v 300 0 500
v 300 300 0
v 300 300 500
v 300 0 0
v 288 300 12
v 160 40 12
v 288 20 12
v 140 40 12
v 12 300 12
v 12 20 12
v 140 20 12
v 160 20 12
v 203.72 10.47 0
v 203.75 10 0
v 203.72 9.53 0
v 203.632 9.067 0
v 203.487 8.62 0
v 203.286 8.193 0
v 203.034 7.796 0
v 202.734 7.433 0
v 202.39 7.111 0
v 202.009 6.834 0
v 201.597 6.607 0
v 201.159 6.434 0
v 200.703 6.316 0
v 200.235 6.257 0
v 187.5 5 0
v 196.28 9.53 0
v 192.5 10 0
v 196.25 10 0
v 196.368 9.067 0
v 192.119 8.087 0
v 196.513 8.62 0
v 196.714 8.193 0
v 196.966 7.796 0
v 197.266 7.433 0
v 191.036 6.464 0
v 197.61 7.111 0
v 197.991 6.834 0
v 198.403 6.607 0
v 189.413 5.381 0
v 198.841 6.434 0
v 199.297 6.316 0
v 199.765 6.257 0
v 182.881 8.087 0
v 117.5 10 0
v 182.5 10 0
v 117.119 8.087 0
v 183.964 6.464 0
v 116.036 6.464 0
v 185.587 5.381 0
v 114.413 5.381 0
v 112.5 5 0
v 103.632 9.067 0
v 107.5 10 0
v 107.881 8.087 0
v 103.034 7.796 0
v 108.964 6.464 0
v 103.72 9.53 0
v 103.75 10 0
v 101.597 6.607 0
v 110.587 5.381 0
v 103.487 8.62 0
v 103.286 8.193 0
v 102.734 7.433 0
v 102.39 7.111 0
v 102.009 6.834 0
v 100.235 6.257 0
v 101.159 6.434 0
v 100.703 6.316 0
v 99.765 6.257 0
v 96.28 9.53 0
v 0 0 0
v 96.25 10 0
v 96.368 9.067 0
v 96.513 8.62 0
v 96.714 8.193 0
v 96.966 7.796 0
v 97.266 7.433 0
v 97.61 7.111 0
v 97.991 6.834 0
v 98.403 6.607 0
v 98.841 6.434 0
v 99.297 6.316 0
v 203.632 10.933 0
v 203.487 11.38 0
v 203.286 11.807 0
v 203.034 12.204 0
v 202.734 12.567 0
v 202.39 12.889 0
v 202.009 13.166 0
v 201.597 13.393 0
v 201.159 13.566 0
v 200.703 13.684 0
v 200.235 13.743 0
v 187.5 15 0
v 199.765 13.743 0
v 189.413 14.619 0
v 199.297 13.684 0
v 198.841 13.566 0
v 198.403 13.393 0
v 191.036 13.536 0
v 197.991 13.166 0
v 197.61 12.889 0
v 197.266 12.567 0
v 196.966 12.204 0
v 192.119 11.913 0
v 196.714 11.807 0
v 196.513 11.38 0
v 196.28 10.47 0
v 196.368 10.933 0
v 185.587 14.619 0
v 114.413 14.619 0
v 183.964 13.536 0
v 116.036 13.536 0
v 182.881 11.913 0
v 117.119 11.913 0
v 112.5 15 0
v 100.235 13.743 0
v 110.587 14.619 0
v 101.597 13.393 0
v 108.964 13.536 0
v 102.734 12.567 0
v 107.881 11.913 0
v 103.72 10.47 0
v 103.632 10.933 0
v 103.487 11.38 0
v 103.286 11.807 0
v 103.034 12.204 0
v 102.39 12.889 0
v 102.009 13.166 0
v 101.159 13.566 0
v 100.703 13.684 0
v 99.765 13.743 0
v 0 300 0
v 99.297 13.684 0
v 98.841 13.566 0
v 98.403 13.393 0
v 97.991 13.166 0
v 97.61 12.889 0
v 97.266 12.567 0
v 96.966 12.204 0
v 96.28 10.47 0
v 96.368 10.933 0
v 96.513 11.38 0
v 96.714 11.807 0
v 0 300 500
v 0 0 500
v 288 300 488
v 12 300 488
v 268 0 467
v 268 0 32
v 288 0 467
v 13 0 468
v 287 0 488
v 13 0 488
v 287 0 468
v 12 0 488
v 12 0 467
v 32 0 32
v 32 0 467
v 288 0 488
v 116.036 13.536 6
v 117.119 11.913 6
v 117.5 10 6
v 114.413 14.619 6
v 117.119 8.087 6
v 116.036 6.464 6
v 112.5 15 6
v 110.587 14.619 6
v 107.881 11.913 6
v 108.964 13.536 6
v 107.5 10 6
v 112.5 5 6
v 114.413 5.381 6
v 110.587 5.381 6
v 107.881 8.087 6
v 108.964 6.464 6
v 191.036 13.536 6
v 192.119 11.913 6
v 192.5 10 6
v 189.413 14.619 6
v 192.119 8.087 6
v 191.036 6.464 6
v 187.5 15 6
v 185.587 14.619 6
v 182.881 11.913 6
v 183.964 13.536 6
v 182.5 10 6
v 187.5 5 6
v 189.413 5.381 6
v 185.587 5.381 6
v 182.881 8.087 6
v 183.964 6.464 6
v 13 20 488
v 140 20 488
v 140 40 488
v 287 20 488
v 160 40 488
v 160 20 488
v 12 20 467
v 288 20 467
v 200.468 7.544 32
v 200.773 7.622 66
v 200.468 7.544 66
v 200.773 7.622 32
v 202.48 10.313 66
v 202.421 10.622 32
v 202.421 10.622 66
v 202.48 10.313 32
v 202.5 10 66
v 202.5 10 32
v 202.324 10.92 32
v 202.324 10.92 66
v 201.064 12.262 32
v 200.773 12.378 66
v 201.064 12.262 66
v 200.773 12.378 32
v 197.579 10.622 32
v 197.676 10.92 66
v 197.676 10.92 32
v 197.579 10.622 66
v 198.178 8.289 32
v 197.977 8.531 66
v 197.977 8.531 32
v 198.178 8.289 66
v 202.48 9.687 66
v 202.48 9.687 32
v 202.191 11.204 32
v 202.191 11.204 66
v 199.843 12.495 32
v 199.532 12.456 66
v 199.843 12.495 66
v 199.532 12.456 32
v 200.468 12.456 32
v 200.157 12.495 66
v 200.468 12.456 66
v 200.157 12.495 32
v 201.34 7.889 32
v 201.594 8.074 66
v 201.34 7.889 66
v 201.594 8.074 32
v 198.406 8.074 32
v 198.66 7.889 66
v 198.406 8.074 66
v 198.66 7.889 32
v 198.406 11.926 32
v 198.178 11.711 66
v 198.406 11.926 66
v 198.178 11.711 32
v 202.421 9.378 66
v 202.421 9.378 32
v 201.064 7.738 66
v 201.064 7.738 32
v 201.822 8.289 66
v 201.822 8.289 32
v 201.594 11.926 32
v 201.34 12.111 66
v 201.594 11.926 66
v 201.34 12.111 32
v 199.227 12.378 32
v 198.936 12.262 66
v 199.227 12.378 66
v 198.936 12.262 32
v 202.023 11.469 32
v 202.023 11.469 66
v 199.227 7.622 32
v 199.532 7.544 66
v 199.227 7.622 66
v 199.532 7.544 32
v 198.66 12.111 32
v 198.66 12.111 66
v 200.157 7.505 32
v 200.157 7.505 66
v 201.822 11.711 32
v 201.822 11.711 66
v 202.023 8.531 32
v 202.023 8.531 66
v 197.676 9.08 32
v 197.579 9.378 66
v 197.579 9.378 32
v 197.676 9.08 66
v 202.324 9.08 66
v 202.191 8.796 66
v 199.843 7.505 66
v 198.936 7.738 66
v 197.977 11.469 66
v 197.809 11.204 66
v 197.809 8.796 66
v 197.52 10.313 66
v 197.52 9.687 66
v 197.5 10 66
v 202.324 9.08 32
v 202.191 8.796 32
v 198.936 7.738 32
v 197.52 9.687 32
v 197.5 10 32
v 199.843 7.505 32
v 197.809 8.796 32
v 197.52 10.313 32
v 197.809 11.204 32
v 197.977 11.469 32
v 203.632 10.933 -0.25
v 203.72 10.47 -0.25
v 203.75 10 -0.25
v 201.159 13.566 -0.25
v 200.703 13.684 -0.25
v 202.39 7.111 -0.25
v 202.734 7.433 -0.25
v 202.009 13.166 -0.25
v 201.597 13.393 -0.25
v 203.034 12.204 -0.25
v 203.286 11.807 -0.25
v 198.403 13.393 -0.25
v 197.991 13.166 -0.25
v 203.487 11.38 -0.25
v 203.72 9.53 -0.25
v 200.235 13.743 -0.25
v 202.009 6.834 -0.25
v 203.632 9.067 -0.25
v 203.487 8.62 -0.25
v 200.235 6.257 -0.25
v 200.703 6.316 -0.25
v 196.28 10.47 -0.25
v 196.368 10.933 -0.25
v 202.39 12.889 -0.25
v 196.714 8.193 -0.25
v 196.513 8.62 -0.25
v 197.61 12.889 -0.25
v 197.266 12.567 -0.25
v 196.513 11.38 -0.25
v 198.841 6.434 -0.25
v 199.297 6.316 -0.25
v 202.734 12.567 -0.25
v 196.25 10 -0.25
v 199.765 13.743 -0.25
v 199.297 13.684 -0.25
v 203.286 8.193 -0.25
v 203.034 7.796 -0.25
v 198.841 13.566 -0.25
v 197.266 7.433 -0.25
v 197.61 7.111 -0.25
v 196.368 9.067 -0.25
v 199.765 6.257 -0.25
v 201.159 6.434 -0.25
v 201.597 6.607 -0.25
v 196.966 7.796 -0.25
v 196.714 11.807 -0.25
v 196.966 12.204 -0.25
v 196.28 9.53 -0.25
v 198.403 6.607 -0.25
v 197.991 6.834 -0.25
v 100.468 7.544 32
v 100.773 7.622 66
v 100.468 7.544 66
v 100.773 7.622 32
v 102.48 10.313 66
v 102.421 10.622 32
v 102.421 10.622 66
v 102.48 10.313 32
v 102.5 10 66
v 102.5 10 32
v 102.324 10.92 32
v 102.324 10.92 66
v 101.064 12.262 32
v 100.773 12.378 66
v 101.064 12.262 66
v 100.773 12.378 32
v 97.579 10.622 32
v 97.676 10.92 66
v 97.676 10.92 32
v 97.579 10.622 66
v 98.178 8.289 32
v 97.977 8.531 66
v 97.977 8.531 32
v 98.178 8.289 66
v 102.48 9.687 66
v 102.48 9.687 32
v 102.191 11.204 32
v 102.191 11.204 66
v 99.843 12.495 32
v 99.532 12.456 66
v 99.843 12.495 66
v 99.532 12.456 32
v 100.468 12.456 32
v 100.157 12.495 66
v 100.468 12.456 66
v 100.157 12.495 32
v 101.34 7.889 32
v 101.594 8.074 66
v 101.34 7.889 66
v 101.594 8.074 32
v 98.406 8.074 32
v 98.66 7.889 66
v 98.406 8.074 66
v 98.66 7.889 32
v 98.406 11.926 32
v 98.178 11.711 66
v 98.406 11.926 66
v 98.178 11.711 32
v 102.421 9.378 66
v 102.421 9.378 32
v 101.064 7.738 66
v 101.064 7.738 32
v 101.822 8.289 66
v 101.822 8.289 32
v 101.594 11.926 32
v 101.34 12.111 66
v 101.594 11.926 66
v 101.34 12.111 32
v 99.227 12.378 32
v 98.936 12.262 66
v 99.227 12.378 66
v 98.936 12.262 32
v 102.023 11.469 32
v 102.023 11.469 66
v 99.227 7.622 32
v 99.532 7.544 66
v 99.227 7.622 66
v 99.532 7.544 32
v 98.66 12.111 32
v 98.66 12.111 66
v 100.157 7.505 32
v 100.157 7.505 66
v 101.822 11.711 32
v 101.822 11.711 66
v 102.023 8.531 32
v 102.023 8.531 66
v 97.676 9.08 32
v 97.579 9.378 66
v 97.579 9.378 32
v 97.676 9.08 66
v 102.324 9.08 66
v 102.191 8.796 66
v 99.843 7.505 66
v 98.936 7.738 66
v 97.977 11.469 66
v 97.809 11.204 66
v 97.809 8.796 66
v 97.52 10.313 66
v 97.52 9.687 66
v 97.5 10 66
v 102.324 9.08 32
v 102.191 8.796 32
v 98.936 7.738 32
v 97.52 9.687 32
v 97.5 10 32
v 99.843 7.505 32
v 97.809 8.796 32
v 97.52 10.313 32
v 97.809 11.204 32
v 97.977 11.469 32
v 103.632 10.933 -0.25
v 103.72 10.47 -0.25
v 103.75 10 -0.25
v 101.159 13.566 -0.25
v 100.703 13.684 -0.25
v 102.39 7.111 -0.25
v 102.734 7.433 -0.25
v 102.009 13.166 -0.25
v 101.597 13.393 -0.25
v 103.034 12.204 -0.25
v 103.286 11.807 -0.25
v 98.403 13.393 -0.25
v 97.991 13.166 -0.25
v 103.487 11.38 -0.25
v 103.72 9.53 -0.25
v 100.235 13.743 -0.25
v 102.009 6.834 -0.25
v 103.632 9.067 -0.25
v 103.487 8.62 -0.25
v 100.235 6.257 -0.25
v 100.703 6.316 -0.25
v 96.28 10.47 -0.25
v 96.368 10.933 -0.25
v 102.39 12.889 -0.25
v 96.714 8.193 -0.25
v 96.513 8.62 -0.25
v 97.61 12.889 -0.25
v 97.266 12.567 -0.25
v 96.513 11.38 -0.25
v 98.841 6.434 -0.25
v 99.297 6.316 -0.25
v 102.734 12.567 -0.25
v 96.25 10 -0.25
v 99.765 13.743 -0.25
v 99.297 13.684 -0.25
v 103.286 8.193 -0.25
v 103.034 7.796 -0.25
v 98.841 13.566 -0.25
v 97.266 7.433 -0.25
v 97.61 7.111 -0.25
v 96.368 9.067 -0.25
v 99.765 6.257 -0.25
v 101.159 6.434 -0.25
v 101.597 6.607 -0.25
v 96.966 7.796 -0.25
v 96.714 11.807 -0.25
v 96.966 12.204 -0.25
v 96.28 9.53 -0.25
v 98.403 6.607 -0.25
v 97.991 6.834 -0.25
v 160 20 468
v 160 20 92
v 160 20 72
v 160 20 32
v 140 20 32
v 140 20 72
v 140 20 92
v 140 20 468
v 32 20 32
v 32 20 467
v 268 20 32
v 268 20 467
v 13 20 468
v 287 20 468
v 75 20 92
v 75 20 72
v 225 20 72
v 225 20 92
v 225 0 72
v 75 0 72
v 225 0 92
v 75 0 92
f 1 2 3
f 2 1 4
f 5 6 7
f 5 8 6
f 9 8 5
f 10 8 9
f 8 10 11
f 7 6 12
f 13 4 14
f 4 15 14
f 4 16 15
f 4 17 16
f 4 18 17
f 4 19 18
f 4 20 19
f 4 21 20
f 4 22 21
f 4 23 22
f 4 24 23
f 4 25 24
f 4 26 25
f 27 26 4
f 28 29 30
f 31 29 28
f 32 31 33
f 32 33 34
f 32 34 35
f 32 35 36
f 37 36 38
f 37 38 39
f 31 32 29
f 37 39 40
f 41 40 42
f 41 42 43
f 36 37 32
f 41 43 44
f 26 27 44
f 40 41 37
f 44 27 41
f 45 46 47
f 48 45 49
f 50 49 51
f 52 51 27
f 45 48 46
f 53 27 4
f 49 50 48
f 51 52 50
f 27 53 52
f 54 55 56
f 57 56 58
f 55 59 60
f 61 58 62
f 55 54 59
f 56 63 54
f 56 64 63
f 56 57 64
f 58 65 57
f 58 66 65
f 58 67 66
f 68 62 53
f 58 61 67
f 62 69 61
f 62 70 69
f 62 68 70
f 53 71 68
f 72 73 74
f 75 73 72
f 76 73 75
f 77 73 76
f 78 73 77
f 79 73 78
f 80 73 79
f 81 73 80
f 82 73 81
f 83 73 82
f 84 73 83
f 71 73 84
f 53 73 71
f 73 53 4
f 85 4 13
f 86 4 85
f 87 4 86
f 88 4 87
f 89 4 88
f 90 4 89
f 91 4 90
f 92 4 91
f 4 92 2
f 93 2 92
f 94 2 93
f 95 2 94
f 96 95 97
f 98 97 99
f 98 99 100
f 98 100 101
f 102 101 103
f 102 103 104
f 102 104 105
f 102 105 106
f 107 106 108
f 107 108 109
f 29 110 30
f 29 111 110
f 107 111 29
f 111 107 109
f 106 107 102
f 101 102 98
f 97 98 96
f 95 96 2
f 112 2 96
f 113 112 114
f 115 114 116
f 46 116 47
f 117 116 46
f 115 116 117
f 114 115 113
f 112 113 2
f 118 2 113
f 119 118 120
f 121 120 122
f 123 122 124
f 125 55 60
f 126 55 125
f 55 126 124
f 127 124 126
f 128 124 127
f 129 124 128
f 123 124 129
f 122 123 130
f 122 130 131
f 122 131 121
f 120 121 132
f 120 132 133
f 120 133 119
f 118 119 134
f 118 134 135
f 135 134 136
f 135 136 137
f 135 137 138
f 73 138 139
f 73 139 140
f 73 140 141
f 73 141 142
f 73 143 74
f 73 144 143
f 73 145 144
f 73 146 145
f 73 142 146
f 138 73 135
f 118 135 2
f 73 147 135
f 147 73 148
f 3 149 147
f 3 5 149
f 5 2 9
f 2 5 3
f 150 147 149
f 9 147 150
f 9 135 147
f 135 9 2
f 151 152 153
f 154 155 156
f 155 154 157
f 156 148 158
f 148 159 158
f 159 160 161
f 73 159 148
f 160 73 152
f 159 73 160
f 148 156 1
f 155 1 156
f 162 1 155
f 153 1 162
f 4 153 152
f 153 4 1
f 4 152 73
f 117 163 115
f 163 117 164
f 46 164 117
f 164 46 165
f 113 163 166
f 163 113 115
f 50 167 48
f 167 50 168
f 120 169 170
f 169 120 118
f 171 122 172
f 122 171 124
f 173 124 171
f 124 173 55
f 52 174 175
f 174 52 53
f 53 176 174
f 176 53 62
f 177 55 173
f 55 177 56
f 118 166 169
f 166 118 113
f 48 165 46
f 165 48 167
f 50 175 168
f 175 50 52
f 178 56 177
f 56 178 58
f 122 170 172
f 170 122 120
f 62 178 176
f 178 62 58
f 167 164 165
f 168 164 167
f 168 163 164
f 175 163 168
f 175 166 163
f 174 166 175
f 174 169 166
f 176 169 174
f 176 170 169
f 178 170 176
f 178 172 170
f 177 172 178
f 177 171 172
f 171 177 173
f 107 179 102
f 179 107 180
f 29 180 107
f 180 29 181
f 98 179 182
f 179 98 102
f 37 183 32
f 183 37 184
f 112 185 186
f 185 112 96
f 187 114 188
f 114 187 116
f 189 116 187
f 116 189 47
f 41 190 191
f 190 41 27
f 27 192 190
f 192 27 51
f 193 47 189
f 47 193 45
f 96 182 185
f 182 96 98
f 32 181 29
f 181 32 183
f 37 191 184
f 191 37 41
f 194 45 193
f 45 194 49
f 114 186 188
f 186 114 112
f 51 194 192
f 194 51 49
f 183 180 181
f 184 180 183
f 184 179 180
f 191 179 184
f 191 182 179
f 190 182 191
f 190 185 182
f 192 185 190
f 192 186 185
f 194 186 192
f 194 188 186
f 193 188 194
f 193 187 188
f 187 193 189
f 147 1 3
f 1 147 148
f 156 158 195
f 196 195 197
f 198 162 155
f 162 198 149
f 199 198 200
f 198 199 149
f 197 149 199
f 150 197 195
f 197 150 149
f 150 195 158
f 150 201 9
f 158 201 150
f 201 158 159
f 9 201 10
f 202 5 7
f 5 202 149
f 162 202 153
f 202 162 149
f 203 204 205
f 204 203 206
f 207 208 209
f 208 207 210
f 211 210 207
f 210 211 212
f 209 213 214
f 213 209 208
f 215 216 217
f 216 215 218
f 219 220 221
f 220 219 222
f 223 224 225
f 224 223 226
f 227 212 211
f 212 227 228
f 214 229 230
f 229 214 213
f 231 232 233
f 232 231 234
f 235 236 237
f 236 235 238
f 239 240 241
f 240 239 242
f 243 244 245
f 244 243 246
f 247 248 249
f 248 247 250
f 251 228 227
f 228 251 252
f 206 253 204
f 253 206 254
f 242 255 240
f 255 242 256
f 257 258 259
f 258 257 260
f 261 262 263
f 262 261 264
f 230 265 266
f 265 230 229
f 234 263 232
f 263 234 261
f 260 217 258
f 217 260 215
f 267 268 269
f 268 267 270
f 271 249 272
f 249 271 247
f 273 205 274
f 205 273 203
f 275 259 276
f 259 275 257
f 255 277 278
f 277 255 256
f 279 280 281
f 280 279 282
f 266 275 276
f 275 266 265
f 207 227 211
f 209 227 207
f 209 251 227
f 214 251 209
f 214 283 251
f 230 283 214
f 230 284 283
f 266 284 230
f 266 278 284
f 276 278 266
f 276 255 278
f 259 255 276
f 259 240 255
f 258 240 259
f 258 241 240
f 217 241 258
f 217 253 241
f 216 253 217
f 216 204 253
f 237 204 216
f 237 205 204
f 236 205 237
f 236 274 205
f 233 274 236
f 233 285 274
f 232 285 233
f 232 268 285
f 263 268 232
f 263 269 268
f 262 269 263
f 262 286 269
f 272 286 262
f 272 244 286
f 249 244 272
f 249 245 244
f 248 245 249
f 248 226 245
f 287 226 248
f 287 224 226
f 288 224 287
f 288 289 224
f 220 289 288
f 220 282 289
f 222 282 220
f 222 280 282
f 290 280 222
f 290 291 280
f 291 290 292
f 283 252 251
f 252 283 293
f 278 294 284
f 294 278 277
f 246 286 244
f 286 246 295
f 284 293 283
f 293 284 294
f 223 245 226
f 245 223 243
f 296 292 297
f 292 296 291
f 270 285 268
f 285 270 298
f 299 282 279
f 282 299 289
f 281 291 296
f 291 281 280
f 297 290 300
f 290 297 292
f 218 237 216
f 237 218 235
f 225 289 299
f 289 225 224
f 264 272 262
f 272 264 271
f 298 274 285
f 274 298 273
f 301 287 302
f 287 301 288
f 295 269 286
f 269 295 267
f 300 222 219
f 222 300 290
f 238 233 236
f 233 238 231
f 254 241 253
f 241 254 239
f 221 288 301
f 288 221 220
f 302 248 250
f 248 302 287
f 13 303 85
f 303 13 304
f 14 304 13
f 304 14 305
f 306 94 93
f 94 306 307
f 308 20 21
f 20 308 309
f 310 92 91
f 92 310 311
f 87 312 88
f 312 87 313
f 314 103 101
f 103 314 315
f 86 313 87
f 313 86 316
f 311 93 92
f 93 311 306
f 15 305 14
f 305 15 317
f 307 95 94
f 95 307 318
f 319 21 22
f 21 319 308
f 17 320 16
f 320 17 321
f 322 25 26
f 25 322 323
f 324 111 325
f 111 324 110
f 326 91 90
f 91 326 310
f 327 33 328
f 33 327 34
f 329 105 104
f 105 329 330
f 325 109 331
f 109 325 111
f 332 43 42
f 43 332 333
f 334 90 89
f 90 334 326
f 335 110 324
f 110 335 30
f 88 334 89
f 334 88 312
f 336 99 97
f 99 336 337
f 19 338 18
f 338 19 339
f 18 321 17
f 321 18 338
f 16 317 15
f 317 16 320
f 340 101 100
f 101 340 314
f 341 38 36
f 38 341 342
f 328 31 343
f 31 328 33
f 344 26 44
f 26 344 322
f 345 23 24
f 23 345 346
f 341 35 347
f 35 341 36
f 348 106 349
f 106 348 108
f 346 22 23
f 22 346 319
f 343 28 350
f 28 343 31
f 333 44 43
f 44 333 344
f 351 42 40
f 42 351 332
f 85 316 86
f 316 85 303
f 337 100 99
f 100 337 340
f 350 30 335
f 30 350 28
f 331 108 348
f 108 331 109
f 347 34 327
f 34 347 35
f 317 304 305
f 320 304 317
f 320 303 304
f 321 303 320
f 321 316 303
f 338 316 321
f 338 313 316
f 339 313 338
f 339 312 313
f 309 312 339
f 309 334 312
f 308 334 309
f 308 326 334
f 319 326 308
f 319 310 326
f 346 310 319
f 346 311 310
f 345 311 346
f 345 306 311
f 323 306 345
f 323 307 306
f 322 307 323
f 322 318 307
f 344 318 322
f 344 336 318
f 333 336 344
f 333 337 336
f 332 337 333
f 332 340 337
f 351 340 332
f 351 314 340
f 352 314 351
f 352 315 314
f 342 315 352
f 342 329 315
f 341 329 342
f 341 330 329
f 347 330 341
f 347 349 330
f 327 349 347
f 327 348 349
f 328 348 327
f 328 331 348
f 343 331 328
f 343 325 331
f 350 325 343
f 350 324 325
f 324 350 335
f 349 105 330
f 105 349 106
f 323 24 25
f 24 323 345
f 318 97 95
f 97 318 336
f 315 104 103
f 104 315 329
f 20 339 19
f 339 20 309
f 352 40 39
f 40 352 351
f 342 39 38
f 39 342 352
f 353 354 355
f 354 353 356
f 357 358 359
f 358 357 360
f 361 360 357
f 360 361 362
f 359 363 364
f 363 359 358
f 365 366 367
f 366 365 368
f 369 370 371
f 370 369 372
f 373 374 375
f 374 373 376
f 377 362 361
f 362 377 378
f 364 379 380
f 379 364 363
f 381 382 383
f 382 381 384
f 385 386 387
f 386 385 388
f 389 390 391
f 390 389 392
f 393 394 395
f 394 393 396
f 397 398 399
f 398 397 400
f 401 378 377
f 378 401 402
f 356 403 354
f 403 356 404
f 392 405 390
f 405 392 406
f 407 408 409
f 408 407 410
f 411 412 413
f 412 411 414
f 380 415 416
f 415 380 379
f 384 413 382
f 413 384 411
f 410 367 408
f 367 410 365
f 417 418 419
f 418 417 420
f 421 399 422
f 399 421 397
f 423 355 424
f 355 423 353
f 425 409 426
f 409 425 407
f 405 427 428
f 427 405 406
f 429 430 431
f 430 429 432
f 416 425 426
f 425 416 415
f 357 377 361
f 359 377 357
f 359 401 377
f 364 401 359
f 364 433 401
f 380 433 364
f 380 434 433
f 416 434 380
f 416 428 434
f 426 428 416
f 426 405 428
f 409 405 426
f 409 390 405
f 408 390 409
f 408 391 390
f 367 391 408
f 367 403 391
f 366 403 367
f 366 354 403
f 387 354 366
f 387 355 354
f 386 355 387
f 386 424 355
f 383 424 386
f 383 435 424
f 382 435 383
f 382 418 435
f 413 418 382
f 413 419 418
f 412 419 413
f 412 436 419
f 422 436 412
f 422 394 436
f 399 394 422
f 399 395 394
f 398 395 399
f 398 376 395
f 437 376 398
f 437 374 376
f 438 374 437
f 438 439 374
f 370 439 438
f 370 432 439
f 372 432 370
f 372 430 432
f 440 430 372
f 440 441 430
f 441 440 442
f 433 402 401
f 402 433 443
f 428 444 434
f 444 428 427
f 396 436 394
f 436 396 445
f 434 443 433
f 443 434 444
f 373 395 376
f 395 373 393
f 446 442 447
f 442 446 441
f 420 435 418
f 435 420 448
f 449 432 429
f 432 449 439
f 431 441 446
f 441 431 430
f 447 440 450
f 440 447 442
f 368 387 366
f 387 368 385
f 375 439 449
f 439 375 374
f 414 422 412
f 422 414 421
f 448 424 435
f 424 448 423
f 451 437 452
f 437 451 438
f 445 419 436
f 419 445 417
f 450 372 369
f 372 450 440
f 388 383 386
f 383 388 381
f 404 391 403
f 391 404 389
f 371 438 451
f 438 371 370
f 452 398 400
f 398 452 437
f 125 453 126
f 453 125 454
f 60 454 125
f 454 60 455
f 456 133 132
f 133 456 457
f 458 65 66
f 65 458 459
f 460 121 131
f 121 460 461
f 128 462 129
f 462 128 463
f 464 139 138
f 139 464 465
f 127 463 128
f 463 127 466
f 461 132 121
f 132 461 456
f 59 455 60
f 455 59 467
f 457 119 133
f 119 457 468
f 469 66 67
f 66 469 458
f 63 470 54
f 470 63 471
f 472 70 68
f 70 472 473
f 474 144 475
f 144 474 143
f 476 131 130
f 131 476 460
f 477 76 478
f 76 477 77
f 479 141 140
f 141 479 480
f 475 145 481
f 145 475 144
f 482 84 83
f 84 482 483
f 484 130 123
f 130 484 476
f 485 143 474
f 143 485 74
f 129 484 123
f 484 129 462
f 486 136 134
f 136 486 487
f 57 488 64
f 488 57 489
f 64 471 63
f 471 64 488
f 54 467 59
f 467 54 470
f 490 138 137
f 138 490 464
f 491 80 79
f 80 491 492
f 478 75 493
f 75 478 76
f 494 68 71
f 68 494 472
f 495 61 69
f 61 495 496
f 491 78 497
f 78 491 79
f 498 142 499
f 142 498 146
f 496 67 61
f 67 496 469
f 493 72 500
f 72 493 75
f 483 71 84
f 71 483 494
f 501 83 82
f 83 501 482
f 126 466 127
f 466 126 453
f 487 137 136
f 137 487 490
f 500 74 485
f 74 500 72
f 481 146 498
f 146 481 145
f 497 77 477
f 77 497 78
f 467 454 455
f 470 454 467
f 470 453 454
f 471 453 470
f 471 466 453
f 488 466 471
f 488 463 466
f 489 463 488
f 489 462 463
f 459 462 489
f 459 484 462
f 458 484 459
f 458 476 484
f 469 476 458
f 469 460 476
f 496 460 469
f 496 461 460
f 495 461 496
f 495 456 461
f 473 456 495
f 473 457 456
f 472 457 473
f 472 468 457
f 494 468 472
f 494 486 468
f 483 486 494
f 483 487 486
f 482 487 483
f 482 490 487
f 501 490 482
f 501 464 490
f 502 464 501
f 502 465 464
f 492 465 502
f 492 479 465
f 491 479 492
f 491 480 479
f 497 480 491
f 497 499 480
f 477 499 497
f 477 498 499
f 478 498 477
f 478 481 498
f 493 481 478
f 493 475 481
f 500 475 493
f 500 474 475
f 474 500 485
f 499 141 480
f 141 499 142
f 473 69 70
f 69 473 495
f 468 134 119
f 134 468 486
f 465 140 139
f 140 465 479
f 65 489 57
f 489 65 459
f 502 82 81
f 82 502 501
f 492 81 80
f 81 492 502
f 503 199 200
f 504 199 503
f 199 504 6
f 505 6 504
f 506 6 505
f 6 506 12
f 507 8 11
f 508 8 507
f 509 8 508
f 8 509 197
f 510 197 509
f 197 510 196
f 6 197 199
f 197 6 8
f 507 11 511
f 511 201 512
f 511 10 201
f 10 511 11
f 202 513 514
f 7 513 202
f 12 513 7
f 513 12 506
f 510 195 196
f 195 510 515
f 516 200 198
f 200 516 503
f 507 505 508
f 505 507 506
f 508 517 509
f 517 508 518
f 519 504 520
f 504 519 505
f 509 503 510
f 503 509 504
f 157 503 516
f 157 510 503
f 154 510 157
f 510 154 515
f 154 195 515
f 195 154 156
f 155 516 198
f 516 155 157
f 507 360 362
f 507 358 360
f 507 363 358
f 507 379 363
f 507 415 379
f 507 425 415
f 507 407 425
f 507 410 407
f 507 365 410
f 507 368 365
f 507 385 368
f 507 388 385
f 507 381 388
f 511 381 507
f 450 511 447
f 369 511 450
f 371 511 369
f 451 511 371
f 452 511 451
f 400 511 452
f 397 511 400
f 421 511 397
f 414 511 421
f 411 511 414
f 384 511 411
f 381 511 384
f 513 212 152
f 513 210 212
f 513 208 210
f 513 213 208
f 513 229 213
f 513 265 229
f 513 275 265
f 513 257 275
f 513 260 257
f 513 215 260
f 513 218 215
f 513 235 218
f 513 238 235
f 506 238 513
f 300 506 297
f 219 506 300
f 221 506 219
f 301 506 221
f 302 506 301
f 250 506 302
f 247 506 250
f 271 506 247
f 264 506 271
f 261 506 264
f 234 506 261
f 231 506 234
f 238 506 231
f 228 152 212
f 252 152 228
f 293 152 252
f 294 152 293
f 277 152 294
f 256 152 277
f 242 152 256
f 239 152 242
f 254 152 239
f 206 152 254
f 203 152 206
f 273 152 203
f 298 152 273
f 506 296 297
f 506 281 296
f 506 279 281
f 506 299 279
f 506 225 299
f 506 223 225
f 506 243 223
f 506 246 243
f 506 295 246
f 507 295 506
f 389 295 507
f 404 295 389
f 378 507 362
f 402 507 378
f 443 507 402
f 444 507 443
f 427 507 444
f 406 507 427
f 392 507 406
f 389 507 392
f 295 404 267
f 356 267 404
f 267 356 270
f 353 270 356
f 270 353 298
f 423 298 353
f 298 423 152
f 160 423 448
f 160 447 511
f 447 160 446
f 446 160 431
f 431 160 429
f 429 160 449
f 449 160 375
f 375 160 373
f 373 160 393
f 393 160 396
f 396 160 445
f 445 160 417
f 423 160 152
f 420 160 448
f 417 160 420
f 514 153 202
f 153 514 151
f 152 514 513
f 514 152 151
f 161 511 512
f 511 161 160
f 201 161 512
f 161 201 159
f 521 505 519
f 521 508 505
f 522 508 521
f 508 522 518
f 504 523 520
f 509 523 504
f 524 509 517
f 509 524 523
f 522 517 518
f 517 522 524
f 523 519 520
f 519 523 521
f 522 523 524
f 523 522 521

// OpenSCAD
// construction of a peruvian drawer
// byteborg 2012
// rudimentary BOM will be echoed on compile

use <MCAD/metric_fastners.scad>;

// system constants
GR = 1.618;  // golden ratio
q = 1;       // precision offset (diff/tolerance)

// material thickness
TCORP = 12;  // corpus
TFRONT = 3;  // front (tapa)
TBACK = 6;   // back
TSQ = 20;    // square wood

// outer dimensions
XDIM = 300;  // width
YDIM = 300;  // depth
ZDIM = 500;  // height

// port dimension
HDIA = 120;
HX = XDIM-(XDIM / GR);
HY = ZDIM-(ZDIM / GR);


module bottom () {
    BOTTOMDIM = [XDIM, YDIM, TCORP];
    HOLE1DIM = [XDIM/2-XDIM/8, TSQ/2, 0];
    HOLE2DIM = [XDIM/2+XDIM/8, TSQ/2, 0];
    echo("BOTTOM", BOTTOMDIM);
    echo("  screws", HOLE1DIM, HOLE2DIM);
    difference () {
        cube(size=BOTTOMDIM);
        translate(HOLE1DIM) cylinder(r=10/2, h=TCORP, center=true);
        translate(HOLE2DIM) cylinder(r=10/2, h=TCORP, center=true);
    }
}

module top () {
    TOPDIM = [XDIM, YDIM, TCORP];
    echo("TOP", TOPDIM);
    cube(size=TOPDIM);
}

module wall() {
    WALLDIM = [ZDIM-TCORP*2, YDIM, TCORP];
    echo("WALL", WALLDIM);
    cube(size=WALLDIM);
}

module back() {
    BACKDIM = [ZDIM, XDIM, TBACK];
    echo("BACK", BACKDIM);
    echo("  port dia", HDIA, "at", [HX, HY]);
    difference() {
        cube(size=BACKDIM);
        translate([HY, HX, -TBACK/2]) cylinder(r=HDIA/2, h=TBACK*2);
    }
}

module front() {
    FRONTDIM = [ZDIM, XDIM, TFRONT];
    HOLESBOT = 7;
    HOLESTOP = 5;
    HOLESLR = 9;
    echo("FRONT", FRONTDIM);
    echo("  holes bottom", HOLESBOT-1, "spacing", XDIM/HOLESBOT);
    echo("  holes top", HOLESTOP-1, "spacing", XDIM/HOLESTOP);
    echo("  holes left/right", HOLESLR-1, "spacing", ZDIM/HOLESLR);
    difference() {
        cube(size=FRONTDIM);
        for (x=[XDIM/HOLESBOT : XDIM/HOLESBOT : XDIM-1]) {
            translate([TCORP/2, x, -.1]) csk_bolt(3, 15);
            echo("    holex", [TCORP/2, x]);
        }
        for (x=[XDIM/HOLESTOP : XDIM/HOLESTOP : XDIM-1]) {
            translate([ZDIM-TCORP/2, x, -.1]) csk_bolt(3, 15);
            echo("    holex", [TCORP/2, x]);
        }
        for (y=[ZDIM/HOLESLR : ZDIM/HOLESLR : ZDIM-1]) {
            translate([y, TCORP/2, -.1]) csk_bolt(3, 15);
            translate([y, XDIM-TCORP/2, -.1]) csk_bolt(3, 15);
            echo("    holey l/r", [y, TCORP/2], [y, XDIM-TCORP/2]);
        }
        // corner holes
        translate([TCORP/2, TCORP/2, -.1]) csk_bolt(3, 15);
        translate([TCORP/2, XDIM-TCORP/2, -.1]) csk_bolt(3, 15);
        echo("    corner holes", [TCORP/2, TCORP/2], [TCORP/2, XDIM-TCORP/2]);
    }
}

module string_assy() {
    VERTDIM = [TSQ, TSQ, ZDIM-TCORP*2];
    TBARDIM = [TSQ, TSQ, XDIM-TCORP*2-q*2];
    FBOTDIM = [TSQ, TSQ, XDIM-TCORP*2];
    FVERTDIM = [TSQ, TSQ, ZDIM-TCORP*2-TSQ*2-q];
    FASTDIM = [TSQ, TSQ, XDIM/2];
    FAST1HOLE = [XDIM/6, TSQ/2, -TCORP/2];
    FAST2HOLE = [-XDIM/6, TSQ/2, -TCORP/2];
    echo("STRING ASSEMBLY");
    echo("  vertical traverse", VERTDIM);
    echo("  T-bar", TBARDIM);
    echo("  frame bottom", FBOTDIM);
    echo("  frame vertical right", FVERTDIM);
    echo("  frame vertical left", FVERTDIM);
    echo("  string fastener", FASTDIM);
    echo("    holes", FAST1HOLE, FAST2HOLE);
    // vertical traverse
    translate([-TSQ/2, TSQ, 0]) cube(size=VERTDIM);
    // upper "T"
    translate([(XDIM-TCORP*2-q*2)/2, 0, ZDIM-TCORP*2-TSQ]) rotate([0, -90, 0]) cube(size=TBARDIM);
    // frame bottom
    translate([(XDIM-TCORP*2)/2, 0, 0]) rotate([0, -90, 0]) cube(size=FBOTDIM);
    // frame right
    translate([(XDIM-TCORP*2)/2-TSQ, 0, TSQ]) cube(size=FVERTDIM);
    // frame left
    translate([-(XDIM-TCORP*2)/2, 0, TSQ]) cube(size=FVERTDIM);
    // string fastener
    translate([XDIM/4, 0, TSQ*3]) rotate([0, -90, 0]) cube(size=FASTDIM);
    // screws
    translate(FAST1HOLE) cap_bolt(5, 60);
    translate(FAST2HOLE) cap_bolt(5, 60);
}

module corpus() {
    bottom();
    translate([0, 0, ZDIM-TCORP]) top();

    translate([TCORP, 0, TCORP]) rotate([0, -90, 0]) wall();
    translate([XDIM, 0, TCORP]) rotate([0, -90, 0]) wall();

    %translate([0, YDIM, 0]) rotate([0, -90, -90]) back();

    %translate([0, -TFRONT, 0]) rotate([0, -90, -90]) front();
}

corpus();
color("BurlyWood") translate([XDIM/2, 0, TCORP]) string_assy();
// front();

//.
